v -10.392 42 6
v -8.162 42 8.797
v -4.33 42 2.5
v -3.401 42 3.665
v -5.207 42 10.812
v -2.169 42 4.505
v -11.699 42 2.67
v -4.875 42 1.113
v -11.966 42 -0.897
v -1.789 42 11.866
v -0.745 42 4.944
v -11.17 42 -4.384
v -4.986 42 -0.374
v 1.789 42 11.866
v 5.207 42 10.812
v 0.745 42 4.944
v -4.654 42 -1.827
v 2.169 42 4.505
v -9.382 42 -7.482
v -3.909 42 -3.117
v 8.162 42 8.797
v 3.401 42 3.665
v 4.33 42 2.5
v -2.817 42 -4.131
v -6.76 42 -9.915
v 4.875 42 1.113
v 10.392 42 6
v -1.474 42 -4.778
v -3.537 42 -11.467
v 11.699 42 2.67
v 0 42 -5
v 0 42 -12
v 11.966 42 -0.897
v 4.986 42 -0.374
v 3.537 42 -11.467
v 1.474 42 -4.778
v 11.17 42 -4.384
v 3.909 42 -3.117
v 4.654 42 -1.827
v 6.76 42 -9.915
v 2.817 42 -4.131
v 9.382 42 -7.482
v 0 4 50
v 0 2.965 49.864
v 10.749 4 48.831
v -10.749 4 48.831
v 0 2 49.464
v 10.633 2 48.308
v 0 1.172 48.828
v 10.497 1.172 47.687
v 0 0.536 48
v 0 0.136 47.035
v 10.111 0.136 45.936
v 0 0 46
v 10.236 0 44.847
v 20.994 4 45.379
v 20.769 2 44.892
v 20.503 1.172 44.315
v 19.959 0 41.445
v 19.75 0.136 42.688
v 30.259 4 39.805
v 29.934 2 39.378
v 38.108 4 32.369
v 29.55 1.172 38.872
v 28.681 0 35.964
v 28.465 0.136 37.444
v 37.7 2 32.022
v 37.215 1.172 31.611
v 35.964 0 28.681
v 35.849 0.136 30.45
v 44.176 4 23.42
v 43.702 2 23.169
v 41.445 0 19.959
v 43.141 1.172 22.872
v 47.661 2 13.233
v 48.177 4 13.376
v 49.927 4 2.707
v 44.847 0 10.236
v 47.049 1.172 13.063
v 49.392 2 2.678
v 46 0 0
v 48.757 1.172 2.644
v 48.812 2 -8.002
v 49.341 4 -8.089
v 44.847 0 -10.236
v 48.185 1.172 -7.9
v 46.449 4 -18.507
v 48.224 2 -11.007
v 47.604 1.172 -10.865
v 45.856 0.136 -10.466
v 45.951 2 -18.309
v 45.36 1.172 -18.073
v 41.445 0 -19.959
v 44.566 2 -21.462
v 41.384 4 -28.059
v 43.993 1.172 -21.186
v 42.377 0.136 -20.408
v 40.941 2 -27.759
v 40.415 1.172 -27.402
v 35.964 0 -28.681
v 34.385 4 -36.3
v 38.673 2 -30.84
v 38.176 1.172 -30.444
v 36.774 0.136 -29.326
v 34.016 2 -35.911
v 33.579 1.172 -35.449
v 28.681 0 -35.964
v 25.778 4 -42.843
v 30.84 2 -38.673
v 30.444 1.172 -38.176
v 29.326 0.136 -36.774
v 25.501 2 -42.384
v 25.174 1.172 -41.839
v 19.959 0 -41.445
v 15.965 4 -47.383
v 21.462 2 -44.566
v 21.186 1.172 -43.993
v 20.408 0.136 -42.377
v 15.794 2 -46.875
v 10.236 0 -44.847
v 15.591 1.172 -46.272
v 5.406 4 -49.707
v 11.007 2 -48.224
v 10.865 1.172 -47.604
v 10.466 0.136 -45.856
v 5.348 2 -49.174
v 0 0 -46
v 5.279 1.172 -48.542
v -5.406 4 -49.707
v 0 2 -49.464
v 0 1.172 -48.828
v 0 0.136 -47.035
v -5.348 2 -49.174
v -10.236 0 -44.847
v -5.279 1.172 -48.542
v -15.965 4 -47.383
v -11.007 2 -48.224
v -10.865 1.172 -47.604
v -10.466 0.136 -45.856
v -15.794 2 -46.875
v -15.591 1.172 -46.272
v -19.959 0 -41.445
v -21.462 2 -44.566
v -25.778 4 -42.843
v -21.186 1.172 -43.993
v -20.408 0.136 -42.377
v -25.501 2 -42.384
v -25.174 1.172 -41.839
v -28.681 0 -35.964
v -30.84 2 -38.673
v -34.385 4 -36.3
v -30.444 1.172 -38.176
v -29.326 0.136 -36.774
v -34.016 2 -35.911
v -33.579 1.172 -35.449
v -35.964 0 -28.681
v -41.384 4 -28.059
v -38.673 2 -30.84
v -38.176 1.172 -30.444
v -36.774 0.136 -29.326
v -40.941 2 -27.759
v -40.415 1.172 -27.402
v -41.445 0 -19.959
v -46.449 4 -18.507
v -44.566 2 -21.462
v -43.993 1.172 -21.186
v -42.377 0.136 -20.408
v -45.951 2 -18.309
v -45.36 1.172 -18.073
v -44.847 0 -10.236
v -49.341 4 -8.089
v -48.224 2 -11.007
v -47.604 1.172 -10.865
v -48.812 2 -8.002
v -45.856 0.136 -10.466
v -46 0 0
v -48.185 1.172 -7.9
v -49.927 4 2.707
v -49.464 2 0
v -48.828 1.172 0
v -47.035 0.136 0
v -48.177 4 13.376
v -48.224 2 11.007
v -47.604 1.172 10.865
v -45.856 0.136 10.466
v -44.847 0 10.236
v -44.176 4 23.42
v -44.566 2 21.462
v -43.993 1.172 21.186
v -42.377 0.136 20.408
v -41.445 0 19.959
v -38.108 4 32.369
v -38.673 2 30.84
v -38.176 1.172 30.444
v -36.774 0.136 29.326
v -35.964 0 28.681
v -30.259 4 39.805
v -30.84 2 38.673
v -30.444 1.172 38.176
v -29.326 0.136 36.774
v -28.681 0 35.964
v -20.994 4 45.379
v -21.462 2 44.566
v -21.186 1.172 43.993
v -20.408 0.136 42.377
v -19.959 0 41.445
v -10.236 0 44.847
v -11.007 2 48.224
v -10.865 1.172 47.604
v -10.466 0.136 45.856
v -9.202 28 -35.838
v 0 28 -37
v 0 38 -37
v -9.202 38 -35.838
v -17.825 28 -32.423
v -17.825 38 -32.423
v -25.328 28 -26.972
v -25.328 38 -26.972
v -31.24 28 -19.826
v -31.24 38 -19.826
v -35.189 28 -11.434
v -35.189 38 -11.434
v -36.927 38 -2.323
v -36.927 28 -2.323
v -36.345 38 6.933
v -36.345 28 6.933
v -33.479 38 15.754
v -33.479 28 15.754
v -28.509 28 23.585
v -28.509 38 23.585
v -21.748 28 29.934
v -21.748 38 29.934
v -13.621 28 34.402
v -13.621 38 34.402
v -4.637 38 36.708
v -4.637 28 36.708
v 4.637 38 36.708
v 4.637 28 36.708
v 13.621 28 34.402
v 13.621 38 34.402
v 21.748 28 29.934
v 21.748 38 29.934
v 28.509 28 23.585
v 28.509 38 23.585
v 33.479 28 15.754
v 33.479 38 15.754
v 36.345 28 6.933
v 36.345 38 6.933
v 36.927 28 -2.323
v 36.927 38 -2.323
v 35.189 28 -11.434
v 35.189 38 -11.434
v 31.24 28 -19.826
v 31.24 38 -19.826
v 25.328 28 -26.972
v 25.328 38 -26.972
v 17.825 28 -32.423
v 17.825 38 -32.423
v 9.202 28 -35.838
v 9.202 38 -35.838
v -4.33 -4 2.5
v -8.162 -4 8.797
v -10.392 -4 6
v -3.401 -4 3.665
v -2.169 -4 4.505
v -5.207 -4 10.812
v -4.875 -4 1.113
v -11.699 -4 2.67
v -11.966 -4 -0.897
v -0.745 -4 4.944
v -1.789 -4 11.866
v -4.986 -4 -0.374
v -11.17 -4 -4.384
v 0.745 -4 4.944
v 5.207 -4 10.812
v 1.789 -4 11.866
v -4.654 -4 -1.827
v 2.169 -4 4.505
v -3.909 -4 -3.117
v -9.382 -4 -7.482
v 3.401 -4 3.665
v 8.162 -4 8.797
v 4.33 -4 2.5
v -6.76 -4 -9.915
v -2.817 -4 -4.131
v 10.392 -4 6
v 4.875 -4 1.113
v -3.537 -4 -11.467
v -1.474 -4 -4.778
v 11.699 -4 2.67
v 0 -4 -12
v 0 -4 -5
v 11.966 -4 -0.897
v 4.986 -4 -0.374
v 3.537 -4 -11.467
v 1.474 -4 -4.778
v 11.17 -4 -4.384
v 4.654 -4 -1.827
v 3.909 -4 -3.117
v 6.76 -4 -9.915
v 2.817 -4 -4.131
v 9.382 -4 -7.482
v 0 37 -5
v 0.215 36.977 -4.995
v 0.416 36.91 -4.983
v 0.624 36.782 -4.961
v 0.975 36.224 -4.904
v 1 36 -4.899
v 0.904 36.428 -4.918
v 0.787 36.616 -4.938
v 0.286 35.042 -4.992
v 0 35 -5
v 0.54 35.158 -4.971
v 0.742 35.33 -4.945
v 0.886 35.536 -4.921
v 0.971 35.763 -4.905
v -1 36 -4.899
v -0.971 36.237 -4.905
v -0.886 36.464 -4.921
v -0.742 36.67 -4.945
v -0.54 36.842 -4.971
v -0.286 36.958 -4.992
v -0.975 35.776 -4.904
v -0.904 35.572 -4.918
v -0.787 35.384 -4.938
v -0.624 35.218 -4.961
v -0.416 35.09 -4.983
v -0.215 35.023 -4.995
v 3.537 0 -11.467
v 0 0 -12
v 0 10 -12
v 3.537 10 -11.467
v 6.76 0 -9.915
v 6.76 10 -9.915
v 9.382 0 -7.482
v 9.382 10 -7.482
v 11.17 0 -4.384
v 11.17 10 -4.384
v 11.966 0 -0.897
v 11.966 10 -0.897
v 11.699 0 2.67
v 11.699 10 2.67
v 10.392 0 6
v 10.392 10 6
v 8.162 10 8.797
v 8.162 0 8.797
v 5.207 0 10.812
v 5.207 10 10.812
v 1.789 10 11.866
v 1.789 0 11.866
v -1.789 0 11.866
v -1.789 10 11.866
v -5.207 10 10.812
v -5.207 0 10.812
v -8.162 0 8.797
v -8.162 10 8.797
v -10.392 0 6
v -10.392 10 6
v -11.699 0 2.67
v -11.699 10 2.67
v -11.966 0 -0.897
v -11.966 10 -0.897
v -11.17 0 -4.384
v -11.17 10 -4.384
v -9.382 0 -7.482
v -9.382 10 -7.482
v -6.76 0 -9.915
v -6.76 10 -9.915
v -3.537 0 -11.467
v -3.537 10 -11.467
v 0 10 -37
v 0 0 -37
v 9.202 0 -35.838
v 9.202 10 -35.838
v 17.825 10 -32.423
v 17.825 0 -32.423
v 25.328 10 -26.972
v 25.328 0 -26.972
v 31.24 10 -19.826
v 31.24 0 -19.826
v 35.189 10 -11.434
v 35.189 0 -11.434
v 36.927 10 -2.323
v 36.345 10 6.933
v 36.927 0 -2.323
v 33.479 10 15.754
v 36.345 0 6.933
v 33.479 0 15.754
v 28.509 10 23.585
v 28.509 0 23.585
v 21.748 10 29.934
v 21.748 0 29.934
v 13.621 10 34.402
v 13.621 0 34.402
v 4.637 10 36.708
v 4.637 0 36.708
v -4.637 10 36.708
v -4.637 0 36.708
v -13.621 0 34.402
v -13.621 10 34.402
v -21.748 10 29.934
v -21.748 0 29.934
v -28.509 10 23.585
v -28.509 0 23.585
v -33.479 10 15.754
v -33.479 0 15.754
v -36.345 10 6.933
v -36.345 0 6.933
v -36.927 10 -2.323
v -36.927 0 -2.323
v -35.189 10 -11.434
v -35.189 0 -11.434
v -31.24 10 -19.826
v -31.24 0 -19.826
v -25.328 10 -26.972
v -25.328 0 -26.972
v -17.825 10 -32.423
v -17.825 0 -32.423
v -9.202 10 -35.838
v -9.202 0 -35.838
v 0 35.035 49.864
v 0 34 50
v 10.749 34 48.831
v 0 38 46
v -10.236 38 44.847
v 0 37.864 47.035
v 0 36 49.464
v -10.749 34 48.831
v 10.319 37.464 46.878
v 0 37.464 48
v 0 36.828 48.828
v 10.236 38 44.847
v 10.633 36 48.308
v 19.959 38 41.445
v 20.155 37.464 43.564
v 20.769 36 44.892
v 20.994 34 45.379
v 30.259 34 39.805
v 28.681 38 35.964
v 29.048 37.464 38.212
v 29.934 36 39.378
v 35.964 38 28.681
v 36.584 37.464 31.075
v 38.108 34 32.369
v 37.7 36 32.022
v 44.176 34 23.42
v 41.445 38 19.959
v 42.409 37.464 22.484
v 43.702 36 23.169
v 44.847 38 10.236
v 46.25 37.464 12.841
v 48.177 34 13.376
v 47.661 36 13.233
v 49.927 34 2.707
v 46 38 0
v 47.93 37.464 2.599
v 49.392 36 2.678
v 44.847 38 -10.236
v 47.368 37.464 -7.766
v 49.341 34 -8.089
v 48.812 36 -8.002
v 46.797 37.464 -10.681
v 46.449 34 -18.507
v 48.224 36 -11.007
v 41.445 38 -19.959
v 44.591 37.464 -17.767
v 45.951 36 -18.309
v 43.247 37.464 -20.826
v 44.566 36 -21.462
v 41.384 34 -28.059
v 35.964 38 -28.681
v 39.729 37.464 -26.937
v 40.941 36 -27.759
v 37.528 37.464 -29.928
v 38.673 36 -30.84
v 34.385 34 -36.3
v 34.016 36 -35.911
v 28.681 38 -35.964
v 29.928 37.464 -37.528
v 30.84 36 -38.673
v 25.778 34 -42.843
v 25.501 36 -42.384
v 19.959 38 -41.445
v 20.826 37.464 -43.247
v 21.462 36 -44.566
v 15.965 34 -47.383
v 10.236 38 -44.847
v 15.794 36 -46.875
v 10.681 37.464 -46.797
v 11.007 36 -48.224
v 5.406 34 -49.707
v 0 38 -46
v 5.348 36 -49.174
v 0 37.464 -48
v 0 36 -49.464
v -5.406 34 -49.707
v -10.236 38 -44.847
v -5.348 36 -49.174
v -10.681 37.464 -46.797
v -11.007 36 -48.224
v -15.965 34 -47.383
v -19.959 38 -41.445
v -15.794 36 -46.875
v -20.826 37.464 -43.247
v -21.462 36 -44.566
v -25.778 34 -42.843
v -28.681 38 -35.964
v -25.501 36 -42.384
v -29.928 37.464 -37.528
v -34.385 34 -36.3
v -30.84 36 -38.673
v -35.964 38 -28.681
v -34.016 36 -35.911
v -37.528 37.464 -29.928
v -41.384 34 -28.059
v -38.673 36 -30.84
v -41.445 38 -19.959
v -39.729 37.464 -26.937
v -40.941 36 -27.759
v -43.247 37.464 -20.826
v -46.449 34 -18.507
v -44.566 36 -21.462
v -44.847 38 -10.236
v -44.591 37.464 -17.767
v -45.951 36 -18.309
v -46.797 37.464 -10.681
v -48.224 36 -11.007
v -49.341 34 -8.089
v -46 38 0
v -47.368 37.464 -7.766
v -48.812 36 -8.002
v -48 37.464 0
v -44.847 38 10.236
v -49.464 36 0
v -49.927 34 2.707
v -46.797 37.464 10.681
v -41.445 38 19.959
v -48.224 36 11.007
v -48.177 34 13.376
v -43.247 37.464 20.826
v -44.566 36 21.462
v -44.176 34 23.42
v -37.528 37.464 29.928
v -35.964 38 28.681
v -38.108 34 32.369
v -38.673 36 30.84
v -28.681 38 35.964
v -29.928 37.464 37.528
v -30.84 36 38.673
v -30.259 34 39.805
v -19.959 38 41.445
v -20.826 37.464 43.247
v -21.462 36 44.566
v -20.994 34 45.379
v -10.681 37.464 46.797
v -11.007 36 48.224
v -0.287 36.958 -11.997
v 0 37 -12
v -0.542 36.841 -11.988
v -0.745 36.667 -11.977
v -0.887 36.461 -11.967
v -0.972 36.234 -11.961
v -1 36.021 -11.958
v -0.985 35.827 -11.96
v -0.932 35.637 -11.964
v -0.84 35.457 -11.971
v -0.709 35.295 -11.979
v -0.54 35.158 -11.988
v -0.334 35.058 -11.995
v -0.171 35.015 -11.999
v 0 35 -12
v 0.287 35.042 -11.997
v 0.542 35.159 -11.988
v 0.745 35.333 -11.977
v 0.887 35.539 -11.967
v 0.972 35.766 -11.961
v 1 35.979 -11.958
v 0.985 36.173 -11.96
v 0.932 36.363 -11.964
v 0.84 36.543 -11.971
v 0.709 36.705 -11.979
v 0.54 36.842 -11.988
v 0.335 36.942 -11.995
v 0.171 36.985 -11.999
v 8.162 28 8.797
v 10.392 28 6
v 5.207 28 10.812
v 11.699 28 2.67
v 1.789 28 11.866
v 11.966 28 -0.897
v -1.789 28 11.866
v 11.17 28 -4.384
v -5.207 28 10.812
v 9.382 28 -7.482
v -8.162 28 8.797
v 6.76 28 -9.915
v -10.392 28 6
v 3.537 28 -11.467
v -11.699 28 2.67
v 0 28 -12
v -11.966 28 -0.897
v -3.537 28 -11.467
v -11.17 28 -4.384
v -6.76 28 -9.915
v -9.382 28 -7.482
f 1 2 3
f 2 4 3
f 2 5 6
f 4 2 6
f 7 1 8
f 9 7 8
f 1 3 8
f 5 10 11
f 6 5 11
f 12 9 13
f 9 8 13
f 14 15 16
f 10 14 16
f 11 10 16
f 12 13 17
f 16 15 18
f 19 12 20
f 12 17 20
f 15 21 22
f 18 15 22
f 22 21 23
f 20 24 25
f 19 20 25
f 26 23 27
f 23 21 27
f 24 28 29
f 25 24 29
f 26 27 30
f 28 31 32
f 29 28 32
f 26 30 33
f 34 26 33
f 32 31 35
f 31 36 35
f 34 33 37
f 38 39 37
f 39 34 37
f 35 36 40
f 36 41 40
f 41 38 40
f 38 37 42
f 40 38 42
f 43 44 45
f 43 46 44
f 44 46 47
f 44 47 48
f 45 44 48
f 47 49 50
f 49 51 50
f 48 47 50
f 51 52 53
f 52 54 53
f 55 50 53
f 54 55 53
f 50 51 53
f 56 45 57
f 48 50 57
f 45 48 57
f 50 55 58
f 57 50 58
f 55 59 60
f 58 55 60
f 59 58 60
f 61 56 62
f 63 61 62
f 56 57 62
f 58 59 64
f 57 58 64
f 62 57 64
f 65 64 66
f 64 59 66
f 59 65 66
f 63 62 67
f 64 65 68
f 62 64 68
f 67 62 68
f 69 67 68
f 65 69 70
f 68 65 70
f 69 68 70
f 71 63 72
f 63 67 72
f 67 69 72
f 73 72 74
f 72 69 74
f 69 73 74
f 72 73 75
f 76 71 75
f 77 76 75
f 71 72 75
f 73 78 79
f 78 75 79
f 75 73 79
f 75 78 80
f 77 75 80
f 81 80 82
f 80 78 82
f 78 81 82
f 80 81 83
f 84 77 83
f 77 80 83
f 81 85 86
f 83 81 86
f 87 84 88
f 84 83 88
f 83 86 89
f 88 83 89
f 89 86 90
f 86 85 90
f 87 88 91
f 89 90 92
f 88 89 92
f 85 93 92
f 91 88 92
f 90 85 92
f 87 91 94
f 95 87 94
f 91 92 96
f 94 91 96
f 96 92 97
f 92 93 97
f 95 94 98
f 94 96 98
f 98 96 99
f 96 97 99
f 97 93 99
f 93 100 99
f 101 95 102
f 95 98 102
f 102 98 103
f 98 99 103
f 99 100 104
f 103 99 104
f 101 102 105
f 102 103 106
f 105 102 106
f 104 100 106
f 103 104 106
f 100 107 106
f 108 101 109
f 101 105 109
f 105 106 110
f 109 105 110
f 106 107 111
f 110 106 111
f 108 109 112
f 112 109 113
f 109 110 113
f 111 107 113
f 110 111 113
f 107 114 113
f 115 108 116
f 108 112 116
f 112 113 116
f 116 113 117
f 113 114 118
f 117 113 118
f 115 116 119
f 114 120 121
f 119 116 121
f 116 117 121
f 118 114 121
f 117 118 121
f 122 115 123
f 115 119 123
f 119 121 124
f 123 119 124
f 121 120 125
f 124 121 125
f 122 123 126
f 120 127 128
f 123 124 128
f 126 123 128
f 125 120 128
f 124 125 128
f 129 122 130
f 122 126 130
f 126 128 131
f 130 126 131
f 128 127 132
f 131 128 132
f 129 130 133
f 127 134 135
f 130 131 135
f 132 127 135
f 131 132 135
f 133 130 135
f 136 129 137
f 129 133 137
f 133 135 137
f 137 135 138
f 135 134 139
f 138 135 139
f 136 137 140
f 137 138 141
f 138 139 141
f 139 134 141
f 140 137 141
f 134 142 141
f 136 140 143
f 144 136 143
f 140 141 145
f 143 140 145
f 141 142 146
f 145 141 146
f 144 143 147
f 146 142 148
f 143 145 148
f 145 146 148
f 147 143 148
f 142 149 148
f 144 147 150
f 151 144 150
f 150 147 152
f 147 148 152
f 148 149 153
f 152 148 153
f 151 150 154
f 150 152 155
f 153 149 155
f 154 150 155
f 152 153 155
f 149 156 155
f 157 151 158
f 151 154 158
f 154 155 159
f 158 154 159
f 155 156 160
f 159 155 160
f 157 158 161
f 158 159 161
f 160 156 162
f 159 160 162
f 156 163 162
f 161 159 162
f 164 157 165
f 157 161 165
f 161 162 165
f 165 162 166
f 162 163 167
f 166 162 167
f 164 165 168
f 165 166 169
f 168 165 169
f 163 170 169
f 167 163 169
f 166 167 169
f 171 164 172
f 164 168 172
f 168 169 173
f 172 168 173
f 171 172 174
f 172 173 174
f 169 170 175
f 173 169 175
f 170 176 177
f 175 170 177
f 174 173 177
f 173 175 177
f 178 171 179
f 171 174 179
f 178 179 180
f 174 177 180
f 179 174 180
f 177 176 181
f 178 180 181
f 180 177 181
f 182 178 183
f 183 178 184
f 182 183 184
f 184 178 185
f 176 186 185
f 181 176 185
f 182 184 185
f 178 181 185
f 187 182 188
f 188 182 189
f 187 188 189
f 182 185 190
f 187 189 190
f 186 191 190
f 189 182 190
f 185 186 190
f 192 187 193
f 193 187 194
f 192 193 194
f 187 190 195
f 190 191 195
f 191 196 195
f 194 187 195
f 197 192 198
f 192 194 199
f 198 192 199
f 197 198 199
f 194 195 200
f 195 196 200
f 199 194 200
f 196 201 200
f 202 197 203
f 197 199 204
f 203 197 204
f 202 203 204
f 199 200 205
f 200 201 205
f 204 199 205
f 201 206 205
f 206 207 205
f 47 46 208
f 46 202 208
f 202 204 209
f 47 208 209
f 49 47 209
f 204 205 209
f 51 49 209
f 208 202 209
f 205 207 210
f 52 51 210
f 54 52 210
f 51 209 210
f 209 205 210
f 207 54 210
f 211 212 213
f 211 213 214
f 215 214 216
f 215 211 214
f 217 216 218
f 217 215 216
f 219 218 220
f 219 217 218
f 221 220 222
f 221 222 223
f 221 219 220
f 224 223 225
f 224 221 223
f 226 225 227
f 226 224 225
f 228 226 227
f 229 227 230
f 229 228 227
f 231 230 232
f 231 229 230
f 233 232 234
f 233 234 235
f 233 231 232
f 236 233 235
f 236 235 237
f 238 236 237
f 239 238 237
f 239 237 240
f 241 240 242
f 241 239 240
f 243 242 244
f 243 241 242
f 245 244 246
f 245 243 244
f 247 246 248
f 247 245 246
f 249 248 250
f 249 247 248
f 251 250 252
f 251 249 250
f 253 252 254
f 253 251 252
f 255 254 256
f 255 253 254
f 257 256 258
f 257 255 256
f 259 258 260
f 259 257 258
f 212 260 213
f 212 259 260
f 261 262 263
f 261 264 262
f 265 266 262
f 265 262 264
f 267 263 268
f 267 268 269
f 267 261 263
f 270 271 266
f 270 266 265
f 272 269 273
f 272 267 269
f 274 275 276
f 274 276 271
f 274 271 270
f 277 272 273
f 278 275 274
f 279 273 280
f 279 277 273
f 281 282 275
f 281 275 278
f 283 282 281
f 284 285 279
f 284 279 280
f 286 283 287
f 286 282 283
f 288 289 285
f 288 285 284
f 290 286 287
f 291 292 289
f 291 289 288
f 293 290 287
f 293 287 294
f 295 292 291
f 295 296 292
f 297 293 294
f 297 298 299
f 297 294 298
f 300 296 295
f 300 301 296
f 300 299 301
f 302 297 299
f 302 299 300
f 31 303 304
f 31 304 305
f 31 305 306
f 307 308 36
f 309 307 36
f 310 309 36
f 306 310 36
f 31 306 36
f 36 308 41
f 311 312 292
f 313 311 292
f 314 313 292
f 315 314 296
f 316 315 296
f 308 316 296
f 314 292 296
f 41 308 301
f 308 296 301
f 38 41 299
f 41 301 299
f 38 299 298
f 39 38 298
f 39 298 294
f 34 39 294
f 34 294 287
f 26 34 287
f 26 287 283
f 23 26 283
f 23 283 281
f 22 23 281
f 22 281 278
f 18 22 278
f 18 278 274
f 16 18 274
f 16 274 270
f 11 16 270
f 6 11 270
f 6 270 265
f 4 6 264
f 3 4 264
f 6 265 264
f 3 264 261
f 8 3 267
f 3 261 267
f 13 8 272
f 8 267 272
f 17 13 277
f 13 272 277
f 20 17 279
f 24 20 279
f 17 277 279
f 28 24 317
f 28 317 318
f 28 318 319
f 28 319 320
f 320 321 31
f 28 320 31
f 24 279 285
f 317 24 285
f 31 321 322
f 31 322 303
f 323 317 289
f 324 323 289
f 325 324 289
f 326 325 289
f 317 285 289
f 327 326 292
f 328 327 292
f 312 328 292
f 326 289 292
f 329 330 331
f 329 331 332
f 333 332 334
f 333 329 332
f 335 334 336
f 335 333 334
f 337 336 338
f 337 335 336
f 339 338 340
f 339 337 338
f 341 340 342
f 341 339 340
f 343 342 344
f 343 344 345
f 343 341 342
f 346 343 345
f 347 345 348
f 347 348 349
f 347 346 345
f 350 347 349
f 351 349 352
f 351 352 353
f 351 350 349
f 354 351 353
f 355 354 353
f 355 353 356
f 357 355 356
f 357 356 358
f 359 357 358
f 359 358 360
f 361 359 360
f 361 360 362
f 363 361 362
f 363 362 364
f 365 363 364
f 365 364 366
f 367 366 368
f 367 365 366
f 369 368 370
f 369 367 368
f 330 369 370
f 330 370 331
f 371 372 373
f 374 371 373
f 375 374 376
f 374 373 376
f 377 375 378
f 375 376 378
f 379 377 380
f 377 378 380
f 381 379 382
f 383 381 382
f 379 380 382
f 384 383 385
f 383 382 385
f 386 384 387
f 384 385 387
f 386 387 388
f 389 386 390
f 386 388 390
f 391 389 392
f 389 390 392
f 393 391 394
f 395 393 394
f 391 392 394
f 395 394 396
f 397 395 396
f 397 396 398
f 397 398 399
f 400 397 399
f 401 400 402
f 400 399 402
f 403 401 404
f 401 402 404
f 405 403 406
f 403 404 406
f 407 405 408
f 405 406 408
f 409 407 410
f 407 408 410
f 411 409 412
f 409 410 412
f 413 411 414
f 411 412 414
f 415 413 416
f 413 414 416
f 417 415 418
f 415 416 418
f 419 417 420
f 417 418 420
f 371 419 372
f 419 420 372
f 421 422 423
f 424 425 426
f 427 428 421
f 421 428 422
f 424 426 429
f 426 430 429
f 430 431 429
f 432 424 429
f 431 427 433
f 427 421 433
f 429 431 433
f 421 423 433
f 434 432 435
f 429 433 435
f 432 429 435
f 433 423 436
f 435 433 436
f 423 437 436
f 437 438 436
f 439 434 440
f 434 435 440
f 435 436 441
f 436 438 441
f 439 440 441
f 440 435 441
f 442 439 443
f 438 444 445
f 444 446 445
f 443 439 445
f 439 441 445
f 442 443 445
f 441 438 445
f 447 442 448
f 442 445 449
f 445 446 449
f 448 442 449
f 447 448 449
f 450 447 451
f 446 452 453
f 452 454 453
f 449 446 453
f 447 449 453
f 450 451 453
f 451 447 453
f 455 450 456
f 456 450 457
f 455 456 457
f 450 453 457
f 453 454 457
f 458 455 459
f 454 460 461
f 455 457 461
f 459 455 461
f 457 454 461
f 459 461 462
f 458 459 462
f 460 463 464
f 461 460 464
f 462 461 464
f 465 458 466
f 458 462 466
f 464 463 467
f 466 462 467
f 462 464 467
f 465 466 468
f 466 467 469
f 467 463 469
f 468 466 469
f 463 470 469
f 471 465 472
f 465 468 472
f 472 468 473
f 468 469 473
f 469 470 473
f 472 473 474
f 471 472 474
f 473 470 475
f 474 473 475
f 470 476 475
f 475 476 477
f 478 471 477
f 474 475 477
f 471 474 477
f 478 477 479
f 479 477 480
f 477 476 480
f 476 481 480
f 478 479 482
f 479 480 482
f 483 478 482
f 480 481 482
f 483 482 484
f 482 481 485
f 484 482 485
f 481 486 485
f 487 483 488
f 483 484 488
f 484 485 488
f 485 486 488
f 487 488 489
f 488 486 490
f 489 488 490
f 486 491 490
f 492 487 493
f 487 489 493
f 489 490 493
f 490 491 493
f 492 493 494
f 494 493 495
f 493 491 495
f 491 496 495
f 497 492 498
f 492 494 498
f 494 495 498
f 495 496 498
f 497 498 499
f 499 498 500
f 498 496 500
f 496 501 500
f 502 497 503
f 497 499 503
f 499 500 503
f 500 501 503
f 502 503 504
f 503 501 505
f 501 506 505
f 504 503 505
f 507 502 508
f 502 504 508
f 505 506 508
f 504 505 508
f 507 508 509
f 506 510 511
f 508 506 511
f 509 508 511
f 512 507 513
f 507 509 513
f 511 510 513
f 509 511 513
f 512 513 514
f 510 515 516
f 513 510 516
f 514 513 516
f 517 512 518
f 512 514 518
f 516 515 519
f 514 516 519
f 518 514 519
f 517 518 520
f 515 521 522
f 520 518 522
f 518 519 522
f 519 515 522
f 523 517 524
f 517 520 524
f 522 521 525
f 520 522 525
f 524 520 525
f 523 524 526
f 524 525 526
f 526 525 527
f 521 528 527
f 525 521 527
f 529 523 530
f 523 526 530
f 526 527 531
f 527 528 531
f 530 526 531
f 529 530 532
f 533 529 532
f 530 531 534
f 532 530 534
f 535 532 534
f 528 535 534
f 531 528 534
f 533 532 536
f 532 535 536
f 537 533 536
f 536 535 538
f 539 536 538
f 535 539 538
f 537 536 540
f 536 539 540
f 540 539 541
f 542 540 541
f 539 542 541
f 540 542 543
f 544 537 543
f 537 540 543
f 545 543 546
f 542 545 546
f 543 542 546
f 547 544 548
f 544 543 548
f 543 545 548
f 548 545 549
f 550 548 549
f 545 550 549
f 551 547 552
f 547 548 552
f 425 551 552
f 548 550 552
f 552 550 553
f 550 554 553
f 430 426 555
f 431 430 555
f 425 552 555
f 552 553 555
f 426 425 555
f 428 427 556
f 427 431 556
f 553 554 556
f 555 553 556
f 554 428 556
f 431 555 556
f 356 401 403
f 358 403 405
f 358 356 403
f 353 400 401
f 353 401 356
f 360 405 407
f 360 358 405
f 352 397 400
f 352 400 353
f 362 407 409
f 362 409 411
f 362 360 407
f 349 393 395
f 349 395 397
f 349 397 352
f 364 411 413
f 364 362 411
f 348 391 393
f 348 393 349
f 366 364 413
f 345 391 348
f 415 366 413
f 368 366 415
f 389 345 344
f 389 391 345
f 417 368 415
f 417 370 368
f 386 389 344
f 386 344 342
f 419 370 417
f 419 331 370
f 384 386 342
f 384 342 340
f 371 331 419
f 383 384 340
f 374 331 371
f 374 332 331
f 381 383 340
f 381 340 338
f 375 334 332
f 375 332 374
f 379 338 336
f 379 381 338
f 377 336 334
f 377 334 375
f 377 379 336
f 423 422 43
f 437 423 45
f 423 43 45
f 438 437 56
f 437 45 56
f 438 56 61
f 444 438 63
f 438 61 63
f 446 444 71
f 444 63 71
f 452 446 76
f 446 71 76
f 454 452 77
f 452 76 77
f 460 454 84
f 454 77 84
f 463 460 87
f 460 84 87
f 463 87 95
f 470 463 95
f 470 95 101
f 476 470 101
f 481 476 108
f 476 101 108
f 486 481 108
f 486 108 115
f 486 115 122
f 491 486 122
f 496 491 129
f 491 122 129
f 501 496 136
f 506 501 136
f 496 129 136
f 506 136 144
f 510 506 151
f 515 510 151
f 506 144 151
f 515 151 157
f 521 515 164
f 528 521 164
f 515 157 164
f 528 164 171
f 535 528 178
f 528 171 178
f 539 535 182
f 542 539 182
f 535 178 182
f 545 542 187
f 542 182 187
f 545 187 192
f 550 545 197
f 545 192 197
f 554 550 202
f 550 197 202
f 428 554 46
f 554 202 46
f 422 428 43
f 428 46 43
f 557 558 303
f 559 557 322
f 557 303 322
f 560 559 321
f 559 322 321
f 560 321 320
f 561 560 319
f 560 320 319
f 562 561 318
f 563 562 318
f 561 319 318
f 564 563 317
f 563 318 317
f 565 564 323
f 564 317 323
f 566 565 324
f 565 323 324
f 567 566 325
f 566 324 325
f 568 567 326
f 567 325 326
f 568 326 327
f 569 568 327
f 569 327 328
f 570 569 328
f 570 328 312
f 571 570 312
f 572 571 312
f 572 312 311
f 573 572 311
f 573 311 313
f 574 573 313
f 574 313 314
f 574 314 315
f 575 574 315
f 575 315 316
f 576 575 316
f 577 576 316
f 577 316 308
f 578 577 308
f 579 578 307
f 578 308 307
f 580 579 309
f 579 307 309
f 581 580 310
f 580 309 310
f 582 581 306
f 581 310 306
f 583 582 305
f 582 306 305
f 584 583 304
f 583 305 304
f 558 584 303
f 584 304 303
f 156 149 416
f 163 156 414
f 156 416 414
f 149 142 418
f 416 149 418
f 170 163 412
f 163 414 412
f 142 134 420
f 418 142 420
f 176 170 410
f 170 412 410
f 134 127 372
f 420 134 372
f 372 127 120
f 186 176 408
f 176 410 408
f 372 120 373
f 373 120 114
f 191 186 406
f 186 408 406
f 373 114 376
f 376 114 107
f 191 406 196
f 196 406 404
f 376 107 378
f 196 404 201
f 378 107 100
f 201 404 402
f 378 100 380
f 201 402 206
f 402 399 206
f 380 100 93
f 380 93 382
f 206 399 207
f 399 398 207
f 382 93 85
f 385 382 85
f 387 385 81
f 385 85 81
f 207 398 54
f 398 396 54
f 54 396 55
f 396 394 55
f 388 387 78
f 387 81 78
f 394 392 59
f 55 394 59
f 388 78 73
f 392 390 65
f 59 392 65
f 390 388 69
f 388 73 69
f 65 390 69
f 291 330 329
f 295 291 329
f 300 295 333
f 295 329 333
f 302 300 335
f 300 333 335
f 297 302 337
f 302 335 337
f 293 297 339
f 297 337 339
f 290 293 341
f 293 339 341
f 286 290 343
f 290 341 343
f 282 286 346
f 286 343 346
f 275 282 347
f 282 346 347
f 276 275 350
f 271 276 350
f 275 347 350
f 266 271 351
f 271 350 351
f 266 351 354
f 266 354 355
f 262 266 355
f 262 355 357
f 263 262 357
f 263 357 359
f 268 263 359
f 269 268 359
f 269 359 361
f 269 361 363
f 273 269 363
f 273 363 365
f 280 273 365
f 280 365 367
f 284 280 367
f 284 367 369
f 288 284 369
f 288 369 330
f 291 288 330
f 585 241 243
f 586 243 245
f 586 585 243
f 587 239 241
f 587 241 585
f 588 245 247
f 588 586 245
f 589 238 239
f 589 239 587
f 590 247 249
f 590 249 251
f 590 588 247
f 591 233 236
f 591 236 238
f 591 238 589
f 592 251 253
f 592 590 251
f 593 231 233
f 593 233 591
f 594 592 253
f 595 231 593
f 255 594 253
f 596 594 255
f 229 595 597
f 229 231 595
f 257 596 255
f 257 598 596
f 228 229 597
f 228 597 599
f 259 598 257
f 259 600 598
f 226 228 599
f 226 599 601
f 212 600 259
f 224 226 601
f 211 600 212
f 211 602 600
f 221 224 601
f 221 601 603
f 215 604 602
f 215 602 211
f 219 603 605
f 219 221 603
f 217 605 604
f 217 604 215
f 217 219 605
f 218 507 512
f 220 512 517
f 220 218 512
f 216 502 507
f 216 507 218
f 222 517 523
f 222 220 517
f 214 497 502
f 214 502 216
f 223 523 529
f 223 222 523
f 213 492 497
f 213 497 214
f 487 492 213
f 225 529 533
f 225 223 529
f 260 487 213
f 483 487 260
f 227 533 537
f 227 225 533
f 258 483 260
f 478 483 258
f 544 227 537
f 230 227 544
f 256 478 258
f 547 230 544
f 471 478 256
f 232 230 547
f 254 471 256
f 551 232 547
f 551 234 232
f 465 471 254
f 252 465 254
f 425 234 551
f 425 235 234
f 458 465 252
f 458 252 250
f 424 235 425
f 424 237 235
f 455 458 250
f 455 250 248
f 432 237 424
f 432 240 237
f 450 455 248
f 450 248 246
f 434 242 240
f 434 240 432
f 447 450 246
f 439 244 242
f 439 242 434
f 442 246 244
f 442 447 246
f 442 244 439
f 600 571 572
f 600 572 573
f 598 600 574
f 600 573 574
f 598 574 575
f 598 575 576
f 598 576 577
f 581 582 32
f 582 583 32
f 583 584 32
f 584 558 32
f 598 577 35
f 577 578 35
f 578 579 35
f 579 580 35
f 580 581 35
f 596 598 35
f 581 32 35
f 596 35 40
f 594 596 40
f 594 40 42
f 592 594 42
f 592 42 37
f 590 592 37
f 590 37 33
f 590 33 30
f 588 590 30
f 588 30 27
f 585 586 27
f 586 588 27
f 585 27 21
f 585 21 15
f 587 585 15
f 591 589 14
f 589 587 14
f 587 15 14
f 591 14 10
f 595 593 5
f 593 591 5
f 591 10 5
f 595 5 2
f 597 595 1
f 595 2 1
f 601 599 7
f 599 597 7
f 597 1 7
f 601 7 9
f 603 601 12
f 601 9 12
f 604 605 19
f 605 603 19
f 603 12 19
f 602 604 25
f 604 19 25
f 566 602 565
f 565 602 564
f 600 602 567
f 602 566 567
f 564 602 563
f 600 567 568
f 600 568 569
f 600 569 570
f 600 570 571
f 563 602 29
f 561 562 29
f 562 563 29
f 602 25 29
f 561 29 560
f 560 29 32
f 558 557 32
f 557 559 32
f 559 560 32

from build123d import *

# Parameters (mm, degrees)
SKETCH1_R           = 50
EXTRUDE1_DEPTH      = 38
EXTRUDE2_DEPTH      = 4
EXTRUDE2_DEPTH_BACK = 42
SKETCH2_R           = 12
SKETCH3_R           = 5
EXTRUDE3_DEPTH      = 77
SKETCH4_R           = 37
SKETCH4_R_2         = 12
EXTRUDE4_DEPTH      = 10
EXTRUDE6_START      = -10
SKETCH5_R           = 37
SKETCH5_R_2         = 12
EXTRUDE6_DEPTH      = 10
FILLET1_R           = 4
SKETCH6_R           = 1
EXTRUDE7_DEPTH      = 12


with BuildPart() as part:
    # Sketch1 → Extrude1 (new body)
    with BuildSketch(Plane(origin=(0, 0, 0), x_dir=(1, 0, 0), z_dir=(0, 1, 0))):
        with Locations(Location((0, 0, 0), (0, 0, 270))):
            Circle(SKETCH1_R)
    extrude(amount=EXTRUDE1_DEPTH)

    # Sketch2 → Extrude2 (add, two sides: drawn at the far end of the back side and taken through both)
    with BuildSketch(Plane.XZ.offset(-EXTRUDE2_DEPTH_BACK)):
        with Locations(Location((0, 0, 0), (0, 0, 270))):
            Circle(SKETCH2_R)
    extrude(amount=EXTRUDE2_DEPTH + EXTRUDE2_DEPTH_BACK)

    # Sketch3 → Extrude3 (cut)
    with BuildSketch(Plane.XZ.offset(4)):
        with Locations(Location((0, 0, 0), (0, 0, 270))):
            Circle(SKETCH3_R)
    extrude(amount=-EXTRUDE3_DEPTH, mode=Mode.SUBTRACT)

    # Sketch4 → Extrude4 (cut)
    with BuildSketch(Plane.XZ):
        with Locations(Location((0, 0, 0), (0, 0, 270))):
            Circle(SKETCH4_R)
        with Locations(Location((0, 0, 0), (0, 0, 270))):
            Circle(SKETCH4_R_2, mode=Mode.SUBTRACT)
    extrude(amount=-EXTRUDE4_DEPTH, mode=Mode.SUBTRACT)

    # Sketch5 → Extrude6 (cut)
    with BuildSketch(Plane(origin=(0, 38, 0), x_dir=(1, 0, 0), z_dir=(0, 1, 0)).offset(EXTRUDE6_START)):
        with Locations(Location((0, 0, 0), (0, 0, 90))):
            Circle(SKETCH5_R)
        with Locations(Location((0, 0, 0), (0, 0, 90))):
            Circle(SKETCH5_R_2, mode=Mode.SUBTRACT)
    extrude(amount=EXTRUDE6_DEPTH, mode=Mode.SUBTRACT)

    # Fillet1
    fillet1_edges = [part.edges().sort_by_distance(p)[0] for p in [
        (0, 0, -50),
        (0, 38, -50),
    ]]
    fillet(fillet1_edges, radius=FILLET1_R)

    # Sketch6 → Extrude7 (cut)
    with BuildSketch(Plane.XY):
        with Locations(Location((0, 36, 0), (0, 0, 90))):
            Circle(SKETCH6_R)
    extrude(amount=-EXTRUDE7_DEPTH, mode=Mode.SUBTRACT)


solid = part.part
